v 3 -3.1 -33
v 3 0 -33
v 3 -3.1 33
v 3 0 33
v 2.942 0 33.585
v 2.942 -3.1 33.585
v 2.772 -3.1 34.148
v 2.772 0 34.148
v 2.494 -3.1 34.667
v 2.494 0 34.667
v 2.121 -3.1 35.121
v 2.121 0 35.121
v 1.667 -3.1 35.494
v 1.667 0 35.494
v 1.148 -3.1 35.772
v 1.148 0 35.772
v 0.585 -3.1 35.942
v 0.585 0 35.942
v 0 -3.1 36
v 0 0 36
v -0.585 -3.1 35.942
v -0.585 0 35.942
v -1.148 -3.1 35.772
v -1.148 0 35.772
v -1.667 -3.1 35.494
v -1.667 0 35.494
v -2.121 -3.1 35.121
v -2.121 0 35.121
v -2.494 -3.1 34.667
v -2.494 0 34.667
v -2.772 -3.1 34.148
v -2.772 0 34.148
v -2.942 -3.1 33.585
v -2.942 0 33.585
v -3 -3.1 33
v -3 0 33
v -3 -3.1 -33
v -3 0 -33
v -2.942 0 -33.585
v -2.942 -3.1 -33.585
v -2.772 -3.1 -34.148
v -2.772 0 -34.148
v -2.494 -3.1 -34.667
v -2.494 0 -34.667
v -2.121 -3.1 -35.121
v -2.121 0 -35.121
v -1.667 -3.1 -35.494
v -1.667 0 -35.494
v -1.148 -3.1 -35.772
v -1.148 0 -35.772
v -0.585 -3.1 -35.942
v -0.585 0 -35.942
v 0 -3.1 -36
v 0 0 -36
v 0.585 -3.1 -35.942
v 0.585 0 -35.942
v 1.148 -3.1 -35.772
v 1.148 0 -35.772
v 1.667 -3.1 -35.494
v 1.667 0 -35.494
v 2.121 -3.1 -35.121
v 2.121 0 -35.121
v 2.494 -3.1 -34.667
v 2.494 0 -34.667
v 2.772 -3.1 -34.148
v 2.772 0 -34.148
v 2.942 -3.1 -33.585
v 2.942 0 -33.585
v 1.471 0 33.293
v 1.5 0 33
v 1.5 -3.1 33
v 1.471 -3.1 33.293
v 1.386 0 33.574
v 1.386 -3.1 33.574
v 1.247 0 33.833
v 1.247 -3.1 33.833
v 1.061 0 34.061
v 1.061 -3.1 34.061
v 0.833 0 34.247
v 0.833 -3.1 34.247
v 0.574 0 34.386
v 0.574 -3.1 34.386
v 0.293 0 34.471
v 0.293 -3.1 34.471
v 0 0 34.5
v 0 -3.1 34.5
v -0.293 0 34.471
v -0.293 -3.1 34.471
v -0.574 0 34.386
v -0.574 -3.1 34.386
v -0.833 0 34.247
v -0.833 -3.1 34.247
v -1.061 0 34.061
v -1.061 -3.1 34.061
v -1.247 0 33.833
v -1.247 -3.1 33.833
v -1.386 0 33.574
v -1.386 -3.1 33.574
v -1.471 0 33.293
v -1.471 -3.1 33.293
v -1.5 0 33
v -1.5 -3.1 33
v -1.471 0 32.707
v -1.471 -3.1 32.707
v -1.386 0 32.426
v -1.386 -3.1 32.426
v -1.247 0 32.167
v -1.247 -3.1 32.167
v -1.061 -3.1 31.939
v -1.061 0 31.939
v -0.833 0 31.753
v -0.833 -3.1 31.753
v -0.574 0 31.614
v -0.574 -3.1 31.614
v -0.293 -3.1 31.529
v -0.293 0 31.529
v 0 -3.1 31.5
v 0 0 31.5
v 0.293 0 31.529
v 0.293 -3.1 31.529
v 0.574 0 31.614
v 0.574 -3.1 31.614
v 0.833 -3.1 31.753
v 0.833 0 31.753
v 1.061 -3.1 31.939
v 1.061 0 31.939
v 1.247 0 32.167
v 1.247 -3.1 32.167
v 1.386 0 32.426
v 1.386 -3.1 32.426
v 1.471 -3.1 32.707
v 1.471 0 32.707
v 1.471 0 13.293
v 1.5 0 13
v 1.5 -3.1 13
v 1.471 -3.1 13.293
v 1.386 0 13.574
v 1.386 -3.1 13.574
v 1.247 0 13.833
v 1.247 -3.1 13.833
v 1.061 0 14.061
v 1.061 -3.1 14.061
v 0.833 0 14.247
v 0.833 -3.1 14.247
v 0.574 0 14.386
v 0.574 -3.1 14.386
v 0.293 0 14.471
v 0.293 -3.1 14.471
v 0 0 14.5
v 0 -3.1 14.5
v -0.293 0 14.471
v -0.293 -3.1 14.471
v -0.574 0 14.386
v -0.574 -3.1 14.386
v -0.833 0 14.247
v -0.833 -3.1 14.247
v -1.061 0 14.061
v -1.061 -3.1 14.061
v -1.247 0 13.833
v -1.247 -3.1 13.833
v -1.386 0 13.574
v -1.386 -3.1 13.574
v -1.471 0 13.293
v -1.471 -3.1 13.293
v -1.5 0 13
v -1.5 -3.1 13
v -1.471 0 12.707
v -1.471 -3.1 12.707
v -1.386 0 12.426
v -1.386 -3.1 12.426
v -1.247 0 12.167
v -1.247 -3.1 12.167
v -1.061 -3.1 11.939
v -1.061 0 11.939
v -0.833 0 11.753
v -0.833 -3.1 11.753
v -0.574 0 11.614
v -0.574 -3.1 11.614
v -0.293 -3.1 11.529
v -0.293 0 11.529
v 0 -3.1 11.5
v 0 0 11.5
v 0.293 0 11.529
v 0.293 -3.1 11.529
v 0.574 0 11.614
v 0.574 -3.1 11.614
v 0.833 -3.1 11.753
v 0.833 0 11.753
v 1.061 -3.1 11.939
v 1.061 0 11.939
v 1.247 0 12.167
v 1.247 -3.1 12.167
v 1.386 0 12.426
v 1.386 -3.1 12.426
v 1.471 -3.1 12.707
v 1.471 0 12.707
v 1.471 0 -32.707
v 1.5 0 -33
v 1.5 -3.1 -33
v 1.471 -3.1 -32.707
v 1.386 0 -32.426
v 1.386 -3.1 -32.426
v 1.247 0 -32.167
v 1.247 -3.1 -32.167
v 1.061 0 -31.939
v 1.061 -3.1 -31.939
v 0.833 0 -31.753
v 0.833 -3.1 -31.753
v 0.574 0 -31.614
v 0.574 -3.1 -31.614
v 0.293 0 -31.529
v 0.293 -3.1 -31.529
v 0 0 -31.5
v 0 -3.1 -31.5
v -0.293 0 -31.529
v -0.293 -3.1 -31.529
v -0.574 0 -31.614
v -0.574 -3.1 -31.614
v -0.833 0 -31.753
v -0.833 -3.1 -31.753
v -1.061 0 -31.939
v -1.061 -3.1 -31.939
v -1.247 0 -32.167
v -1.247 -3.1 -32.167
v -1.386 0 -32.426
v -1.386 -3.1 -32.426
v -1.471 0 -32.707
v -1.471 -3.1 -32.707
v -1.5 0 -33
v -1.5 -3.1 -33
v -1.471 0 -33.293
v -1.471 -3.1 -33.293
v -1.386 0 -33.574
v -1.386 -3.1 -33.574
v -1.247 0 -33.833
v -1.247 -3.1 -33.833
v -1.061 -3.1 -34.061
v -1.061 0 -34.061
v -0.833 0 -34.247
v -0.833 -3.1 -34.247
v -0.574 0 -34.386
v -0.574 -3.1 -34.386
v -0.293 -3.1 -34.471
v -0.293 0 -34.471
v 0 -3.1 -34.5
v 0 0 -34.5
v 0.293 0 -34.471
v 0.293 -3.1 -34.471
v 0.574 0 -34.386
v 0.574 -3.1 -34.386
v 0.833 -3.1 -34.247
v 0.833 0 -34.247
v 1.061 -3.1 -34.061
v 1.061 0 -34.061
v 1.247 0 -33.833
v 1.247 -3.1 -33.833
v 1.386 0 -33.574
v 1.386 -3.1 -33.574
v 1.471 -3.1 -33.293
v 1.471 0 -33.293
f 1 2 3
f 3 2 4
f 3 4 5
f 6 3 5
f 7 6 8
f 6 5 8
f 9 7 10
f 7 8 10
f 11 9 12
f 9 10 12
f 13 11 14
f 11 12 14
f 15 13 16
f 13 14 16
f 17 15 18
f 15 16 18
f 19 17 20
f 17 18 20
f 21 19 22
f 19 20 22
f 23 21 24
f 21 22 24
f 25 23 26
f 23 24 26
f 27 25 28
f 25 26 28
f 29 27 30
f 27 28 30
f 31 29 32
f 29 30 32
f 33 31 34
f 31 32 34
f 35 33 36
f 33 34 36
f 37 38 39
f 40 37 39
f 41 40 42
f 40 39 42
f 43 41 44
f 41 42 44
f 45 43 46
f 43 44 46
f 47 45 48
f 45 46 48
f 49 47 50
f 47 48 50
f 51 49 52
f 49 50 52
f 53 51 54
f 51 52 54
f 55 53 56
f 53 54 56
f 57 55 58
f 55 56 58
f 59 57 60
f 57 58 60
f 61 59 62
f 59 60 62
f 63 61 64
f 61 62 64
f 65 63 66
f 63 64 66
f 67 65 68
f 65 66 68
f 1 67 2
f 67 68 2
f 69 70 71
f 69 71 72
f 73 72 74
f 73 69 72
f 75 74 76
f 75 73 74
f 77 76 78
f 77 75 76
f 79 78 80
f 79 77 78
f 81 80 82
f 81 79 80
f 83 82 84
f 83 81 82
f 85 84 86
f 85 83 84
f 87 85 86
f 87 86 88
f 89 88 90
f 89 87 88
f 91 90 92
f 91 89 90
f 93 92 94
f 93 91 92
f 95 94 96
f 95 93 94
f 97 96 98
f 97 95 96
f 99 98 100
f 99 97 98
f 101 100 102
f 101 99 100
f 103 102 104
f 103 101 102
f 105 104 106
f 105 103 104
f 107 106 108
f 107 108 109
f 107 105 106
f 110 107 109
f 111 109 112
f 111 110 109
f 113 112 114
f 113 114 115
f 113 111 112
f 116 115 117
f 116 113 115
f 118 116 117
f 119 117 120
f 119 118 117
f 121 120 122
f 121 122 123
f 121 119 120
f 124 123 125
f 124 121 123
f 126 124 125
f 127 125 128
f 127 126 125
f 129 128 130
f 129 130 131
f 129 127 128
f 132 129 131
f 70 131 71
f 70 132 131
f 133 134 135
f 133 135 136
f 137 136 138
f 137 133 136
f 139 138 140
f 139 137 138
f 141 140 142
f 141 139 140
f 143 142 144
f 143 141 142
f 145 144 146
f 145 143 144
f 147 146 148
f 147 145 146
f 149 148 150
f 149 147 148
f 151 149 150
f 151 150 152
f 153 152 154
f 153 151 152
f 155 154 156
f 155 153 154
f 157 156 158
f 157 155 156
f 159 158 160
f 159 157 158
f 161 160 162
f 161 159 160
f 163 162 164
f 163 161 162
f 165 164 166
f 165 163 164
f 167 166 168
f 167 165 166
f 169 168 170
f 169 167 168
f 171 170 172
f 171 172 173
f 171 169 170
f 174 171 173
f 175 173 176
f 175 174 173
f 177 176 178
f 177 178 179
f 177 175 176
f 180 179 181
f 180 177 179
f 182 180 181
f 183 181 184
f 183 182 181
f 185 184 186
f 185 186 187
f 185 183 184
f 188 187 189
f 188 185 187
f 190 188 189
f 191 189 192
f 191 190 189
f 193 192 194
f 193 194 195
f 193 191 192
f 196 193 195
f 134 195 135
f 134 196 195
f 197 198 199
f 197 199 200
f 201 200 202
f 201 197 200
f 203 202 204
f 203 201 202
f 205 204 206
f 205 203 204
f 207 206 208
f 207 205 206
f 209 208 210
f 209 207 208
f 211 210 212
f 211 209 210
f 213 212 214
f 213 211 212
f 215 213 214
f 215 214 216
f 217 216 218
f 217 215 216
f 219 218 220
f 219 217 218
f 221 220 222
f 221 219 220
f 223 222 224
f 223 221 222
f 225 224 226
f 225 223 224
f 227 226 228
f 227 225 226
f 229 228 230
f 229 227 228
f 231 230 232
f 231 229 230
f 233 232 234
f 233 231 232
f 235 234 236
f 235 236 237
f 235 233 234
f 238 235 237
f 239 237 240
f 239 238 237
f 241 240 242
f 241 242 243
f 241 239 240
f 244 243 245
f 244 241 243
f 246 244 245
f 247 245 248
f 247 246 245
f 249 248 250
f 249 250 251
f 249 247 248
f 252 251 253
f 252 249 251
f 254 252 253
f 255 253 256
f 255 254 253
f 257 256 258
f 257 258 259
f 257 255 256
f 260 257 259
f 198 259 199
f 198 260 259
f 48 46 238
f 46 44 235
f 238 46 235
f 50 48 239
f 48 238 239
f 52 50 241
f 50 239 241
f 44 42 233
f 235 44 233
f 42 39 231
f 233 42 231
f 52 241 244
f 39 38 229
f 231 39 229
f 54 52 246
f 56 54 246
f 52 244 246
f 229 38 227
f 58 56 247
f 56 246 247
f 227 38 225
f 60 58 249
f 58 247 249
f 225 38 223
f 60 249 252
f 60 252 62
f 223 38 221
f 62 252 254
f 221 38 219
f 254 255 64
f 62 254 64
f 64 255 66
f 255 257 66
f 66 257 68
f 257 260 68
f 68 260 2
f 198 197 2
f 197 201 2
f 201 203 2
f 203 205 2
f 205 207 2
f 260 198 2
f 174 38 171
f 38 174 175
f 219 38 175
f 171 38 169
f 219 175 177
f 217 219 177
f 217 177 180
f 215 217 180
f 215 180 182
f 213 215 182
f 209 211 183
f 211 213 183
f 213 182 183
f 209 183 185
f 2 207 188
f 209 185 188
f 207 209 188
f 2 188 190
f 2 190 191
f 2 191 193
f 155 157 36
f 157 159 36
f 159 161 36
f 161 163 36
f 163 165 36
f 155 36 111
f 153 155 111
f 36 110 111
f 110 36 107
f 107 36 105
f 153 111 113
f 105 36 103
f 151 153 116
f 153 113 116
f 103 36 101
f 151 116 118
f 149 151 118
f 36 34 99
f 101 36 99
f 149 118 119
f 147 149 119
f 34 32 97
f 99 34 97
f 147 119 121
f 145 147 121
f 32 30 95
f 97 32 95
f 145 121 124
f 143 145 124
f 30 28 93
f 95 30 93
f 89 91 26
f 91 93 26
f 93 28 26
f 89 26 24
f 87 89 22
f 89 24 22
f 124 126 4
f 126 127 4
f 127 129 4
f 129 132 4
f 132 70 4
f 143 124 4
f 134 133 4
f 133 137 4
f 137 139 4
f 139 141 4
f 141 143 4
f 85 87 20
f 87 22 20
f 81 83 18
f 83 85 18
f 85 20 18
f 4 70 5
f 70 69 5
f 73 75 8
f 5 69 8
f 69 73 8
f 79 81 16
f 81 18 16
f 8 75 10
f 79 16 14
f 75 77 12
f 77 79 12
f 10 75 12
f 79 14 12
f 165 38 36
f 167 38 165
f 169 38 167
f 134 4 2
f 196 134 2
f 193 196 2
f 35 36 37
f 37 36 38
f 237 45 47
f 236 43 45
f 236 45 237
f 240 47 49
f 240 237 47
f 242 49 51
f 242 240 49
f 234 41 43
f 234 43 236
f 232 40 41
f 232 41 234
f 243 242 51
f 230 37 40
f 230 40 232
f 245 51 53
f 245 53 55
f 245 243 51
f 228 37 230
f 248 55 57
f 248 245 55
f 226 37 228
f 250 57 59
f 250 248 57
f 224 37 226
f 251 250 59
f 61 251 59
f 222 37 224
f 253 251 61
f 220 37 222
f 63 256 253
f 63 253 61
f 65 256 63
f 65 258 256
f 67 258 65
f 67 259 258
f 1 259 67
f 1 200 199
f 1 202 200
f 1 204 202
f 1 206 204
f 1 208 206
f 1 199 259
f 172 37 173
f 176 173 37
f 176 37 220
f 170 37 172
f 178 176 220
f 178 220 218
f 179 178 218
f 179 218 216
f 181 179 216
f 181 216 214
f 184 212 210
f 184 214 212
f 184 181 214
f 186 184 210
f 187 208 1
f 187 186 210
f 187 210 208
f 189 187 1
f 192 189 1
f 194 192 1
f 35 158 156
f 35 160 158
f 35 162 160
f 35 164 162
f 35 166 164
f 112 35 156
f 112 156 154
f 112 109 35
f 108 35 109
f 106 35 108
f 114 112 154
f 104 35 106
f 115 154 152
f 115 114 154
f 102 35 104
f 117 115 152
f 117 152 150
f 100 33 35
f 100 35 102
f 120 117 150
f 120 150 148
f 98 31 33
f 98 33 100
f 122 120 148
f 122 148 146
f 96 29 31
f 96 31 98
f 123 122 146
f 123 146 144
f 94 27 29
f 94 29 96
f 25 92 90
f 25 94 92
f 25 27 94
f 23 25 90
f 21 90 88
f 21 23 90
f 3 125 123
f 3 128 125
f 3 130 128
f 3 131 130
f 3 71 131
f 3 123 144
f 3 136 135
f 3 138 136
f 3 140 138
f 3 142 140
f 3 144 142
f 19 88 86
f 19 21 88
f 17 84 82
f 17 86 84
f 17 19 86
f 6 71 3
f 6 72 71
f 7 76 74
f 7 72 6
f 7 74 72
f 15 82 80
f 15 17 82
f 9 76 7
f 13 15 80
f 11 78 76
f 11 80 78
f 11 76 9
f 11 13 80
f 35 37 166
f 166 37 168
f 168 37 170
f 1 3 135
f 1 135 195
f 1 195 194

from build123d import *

# Parameters (mm, degrees)
F0_R     = 1.5
F1_DEPTH = 3.1


with BuildPart() as f1:
    # F0 (on Front) → F1 (new body)
    with BuildSketch(Plane.XZ):
        with BuildLine():
            Line((3, 0), (3, 33))
            ThreePointArc((3, 33), (0, 36), (-3, 33))
            Line((-3, 33), (-3, 0))
            Line((-3, 0), (-3, -33))
            ThreePointArc((-3, -33), (0, -36), (3, -33))
            Line((3, -33), (3, 0))
        make_face()
        with Locations((0, -33)):
            Circle(F0_R, mode=Mode.SUBTRACT)
        with Locations((0, 13)):
            Circle(F0_R, mode=Mode.SUBTRACT)
        with Locations((0, 33)):
            Circle(F0_R, mode=Mode.SUBTRACT)
    extrude(amount=F1_DEPTH)


solid = f1.part
